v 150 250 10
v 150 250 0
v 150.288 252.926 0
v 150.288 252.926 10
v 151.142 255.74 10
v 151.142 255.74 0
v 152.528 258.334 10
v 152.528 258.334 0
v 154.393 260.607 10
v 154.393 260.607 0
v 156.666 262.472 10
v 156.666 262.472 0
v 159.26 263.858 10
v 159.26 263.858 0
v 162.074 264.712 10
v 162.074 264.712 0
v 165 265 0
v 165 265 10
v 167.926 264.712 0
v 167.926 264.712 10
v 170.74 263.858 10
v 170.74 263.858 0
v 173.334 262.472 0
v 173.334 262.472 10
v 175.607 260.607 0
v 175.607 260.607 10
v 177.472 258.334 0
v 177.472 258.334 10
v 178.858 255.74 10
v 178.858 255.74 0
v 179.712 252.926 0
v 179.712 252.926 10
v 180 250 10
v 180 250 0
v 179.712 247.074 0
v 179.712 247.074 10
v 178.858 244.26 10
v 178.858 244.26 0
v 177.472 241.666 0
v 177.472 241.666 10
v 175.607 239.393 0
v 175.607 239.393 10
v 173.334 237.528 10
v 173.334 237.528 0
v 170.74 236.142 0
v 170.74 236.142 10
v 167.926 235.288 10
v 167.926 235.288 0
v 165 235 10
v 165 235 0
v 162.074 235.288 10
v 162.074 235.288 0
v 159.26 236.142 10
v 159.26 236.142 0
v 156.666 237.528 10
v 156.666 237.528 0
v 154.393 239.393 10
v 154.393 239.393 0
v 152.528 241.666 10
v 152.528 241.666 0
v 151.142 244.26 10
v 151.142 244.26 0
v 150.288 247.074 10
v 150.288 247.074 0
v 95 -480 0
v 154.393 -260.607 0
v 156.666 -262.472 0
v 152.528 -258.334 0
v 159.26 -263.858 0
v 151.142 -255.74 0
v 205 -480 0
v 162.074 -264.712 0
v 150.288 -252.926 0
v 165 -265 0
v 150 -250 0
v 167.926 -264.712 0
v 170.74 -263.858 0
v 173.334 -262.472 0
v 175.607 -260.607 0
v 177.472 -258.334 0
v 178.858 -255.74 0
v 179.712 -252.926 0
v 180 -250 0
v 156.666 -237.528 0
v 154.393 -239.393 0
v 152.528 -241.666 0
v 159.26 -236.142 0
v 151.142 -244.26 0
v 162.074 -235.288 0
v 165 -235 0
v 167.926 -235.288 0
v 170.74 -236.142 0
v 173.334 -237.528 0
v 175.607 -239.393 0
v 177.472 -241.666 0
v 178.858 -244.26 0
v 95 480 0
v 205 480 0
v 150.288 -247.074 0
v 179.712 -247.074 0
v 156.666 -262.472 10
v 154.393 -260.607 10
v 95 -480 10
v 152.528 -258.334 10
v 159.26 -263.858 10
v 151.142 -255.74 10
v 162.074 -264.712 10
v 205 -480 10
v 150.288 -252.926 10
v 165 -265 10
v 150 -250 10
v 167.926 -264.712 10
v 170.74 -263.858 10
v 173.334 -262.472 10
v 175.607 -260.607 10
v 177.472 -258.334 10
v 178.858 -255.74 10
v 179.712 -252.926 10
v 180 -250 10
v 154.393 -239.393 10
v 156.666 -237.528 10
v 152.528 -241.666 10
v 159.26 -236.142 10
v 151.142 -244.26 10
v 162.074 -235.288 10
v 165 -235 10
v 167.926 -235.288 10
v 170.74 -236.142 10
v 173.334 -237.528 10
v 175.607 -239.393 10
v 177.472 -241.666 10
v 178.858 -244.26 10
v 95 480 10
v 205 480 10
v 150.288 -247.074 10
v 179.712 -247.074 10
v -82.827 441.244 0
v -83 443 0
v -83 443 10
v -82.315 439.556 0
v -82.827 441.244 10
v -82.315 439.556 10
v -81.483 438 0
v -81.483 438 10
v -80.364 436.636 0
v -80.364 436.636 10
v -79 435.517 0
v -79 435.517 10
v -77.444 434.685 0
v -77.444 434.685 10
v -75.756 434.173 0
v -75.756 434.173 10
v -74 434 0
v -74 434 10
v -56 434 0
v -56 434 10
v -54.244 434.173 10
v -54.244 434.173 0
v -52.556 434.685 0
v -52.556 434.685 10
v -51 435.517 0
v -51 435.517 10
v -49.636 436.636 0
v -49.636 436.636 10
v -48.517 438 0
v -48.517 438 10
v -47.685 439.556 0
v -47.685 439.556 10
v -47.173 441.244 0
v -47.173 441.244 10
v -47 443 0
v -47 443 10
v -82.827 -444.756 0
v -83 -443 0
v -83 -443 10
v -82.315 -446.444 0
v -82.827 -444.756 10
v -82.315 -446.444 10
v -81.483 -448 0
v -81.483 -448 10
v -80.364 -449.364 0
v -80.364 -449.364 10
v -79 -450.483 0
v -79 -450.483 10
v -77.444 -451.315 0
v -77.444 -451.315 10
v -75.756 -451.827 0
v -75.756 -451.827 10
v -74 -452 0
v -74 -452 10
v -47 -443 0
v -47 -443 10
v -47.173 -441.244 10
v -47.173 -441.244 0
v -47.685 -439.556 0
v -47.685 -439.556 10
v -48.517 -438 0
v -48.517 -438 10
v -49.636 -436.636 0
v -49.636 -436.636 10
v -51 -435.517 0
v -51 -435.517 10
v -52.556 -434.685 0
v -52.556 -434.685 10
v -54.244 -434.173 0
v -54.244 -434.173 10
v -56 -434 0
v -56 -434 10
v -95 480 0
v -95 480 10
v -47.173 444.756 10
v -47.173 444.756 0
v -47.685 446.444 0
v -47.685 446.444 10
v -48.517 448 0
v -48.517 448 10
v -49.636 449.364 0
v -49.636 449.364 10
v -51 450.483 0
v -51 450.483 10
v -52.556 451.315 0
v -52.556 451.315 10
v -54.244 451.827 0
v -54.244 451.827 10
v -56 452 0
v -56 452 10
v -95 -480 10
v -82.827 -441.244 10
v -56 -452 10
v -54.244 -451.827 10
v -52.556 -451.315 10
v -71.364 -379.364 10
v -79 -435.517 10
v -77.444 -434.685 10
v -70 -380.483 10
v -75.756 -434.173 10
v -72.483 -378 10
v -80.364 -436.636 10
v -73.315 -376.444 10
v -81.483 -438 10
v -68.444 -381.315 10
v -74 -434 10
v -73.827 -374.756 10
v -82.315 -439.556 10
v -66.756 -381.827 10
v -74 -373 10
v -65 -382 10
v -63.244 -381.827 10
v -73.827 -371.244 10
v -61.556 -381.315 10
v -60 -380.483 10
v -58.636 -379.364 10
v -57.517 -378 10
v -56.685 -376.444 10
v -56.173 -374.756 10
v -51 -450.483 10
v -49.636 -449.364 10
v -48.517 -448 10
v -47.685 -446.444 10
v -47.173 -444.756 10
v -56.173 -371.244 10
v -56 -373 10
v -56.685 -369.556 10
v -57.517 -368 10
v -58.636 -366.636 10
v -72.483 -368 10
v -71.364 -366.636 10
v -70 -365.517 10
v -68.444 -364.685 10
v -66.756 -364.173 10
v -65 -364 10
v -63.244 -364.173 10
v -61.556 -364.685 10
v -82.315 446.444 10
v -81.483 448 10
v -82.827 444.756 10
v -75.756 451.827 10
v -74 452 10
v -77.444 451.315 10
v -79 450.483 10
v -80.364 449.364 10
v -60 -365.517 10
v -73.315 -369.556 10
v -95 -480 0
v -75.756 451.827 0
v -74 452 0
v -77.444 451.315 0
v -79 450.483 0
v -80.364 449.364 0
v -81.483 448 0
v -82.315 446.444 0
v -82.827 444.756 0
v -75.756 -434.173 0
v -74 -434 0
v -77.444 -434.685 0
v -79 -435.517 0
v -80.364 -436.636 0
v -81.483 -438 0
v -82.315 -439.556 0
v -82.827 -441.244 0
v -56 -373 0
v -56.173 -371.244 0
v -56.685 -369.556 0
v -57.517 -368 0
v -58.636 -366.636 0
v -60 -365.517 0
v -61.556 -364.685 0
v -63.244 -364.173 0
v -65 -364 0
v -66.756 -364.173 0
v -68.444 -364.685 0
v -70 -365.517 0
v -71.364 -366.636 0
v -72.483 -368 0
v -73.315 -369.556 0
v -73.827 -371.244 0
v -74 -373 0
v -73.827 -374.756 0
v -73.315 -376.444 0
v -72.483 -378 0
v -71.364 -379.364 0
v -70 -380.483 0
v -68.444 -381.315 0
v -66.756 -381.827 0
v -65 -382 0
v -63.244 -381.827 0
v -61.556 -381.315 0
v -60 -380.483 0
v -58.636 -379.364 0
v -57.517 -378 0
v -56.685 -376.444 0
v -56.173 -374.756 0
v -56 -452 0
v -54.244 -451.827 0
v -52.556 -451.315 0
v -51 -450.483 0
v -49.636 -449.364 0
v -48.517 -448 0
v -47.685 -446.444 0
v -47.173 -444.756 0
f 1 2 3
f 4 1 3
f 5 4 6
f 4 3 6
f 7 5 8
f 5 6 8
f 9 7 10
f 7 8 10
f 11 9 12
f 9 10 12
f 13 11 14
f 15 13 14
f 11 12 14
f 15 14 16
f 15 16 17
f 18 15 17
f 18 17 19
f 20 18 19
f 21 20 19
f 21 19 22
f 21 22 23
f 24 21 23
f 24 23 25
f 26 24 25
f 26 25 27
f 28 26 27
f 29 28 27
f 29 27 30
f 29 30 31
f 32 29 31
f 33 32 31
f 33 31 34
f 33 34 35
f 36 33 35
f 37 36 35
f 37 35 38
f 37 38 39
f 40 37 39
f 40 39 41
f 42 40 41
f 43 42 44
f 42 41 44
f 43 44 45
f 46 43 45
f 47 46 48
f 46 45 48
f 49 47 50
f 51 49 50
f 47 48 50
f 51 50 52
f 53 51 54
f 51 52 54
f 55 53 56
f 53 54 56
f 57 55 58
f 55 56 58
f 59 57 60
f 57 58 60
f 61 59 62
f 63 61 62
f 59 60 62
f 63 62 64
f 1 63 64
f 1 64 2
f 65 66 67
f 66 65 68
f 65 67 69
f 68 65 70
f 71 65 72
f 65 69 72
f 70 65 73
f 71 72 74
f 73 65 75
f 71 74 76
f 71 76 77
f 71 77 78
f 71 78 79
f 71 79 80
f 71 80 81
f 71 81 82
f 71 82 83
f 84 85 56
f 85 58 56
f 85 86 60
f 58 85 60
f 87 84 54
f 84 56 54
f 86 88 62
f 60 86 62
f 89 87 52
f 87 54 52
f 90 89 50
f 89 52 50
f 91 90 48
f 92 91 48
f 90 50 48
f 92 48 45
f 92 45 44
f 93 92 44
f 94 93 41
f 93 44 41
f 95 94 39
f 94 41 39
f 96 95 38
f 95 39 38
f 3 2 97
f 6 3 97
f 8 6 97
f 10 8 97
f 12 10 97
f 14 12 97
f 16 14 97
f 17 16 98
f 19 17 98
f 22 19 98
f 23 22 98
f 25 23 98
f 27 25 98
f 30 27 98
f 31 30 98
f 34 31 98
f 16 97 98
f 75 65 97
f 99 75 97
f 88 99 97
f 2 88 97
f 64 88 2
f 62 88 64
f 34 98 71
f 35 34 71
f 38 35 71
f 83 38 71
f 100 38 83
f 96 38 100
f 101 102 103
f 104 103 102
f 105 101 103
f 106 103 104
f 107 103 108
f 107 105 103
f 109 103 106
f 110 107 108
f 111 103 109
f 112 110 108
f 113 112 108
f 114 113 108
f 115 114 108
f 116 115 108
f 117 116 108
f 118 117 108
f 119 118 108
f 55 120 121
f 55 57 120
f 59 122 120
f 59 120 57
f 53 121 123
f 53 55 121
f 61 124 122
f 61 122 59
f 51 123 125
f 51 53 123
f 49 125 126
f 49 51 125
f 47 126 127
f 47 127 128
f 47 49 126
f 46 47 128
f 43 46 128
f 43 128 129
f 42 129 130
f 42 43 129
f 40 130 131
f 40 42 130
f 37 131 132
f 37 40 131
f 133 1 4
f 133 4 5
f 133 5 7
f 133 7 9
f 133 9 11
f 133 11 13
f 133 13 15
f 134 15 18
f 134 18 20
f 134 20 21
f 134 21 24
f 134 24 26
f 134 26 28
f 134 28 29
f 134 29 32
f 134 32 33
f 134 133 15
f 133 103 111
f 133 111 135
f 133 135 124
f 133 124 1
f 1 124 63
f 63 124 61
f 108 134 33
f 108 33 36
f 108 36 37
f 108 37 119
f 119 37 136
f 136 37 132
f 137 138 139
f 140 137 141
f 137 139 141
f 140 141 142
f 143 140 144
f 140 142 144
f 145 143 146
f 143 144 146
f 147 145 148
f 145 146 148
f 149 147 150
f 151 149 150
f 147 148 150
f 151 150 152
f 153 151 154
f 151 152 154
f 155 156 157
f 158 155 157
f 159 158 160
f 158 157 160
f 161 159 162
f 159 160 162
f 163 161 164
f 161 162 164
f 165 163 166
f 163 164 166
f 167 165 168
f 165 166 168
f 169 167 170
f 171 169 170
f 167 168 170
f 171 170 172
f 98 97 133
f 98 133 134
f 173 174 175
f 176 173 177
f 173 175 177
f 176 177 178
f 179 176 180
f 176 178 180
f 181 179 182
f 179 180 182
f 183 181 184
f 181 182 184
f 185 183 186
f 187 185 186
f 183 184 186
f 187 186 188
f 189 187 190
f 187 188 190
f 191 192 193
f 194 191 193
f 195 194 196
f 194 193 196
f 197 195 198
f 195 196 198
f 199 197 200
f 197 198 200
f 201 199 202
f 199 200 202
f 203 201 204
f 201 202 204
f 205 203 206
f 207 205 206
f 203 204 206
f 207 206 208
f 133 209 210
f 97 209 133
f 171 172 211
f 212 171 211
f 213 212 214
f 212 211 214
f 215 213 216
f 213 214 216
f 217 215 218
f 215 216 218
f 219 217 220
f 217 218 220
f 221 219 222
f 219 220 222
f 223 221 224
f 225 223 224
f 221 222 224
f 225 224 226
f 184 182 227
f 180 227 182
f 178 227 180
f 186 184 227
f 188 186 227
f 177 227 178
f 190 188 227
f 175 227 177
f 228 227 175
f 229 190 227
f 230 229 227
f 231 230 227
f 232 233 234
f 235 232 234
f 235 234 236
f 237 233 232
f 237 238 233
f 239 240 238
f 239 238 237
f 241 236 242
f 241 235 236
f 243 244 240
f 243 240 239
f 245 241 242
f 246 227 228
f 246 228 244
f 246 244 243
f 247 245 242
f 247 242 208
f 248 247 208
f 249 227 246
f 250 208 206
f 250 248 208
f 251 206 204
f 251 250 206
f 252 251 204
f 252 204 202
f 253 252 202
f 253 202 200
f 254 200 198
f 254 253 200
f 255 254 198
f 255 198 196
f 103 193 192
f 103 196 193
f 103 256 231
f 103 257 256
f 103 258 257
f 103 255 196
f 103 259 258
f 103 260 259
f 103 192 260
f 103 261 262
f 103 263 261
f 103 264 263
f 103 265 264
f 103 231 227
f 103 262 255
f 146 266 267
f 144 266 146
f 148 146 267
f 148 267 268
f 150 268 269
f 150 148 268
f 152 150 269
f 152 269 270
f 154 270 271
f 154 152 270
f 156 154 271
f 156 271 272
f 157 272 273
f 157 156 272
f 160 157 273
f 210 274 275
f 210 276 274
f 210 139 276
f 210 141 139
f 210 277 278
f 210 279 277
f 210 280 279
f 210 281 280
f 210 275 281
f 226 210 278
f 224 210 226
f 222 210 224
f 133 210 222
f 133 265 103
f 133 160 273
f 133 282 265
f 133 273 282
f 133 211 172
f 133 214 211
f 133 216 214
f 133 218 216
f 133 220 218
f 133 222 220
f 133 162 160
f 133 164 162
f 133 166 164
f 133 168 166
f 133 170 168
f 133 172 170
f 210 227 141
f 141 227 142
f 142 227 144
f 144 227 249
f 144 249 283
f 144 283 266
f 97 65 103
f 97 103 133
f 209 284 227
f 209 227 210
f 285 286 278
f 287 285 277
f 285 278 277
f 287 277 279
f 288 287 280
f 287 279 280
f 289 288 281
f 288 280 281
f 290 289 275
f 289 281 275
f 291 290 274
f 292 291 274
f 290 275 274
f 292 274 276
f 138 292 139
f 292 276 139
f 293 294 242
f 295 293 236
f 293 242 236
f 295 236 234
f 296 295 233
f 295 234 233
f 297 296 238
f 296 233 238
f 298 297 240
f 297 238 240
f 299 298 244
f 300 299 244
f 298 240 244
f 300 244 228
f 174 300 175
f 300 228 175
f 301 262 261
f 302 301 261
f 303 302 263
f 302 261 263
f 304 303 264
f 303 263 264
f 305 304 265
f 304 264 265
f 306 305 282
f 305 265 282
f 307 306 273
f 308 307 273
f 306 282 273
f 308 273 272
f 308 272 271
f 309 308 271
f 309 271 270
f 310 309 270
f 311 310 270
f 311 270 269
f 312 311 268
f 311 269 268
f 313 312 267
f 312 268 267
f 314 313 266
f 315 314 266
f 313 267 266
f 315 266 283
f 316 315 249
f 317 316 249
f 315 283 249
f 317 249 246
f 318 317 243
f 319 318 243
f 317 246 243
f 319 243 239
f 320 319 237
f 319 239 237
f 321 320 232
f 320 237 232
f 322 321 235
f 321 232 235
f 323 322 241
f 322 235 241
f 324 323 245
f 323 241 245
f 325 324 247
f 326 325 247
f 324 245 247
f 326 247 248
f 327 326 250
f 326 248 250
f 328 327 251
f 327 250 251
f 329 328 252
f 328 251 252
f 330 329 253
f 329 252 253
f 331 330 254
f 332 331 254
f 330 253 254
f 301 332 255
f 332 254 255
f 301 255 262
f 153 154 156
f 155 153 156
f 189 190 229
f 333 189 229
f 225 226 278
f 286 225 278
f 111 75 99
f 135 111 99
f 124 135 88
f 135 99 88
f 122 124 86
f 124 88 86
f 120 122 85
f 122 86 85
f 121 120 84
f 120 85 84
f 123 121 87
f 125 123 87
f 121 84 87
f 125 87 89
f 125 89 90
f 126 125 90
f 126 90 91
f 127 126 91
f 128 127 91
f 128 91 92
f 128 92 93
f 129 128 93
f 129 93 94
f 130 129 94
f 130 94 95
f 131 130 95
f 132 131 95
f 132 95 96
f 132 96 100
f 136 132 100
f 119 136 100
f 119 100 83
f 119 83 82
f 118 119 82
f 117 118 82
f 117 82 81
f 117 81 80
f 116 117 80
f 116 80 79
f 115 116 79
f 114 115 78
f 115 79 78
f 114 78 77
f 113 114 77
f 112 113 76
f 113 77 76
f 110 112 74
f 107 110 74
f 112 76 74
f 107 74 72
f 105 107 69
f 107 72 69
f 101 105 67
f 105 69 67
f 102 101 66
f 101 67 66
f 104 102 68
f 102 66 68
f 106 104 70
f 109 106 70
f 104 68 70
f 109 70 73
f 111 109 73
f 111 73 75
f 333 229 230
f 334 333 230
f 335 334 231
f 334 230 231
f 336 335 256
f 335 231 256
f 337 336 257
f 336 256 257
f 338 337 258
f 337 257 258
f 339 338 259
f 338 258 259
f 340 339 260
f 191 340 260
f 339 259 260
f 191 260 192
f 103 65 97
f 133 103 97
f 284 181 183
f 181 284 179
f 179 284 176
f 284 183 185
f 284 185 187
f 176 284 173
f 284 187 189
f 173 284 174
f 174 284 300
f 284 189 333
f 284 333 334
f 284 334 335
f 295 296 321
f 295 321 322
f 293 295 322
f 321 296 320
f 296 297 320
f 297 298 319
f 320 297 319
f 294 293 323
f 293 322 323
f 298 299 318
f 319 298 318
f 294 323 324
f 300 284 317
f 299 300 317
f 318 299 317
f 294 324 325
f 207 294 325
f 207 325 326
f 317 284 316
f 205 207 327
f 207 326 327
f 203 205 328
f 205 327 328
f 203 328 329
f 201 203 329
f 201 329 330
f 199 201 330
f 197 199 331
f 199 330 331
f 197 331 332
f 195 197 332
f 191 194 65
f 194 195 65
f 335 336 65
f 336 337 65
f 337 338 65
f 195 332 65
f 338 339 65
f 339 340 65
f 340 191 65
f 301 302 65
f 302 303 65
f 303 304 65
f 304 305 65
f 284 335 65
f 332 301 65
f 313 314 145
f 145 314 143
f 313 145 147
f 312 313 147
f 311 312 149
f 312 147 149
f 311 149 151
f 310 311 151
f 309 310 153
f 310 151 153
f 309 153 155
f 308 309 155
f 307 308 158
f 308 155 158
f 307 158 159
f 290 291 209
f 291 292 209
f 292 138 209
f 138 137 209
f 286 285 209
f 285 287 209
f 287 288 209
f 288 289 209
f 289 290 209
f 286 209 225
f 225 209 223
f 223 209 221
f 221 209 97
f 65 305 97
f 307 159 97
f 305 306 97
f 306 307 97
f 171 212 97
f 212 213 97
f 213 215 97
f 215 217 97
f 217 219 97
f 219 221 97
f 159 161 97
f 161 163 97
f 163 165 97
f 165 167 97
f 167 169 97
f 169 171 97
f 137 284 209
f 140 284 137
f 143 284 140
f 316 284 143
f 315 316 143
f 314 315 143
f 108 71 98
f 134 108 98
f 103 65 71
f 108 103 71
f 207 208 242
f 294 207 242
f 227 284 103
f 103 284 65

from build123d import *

# Parameters (mm, degrees)
F0_W     = 190
F0_H     = 960
F1_DEPTH = 10
F0_W_2   = 110
F2_DEPTH = 10
F3_R     = 9
F4_DEPTH = 10
F5_D     = 30


with BuildPart() as f1:
    # F0 (on Top) → F1 (new body)
    with BuildSketch(Plane.XY):
        Rectangle(F0_W, F0_H)
    extrude(amount=F1_DEPTH)

    # F3 (on face) → F4 (cut, through all)
    with BuildSketch(Plane.XY.offset(10)):
        with BuildLine():
            ThreePointArc((-47, -443), (-49.6360389693, -436.6360389693), (-56, -434))
            Line((-56, -434), (-74, -434))
            ThreePointArc((-74, -434), (-80.3639610307, -436.6360389693), (-83, -443))
            ThreePointArc((-83, -443), (-80.3639610307, -449.3639610307), (-74, -452))
            Line((-74, -452), (-56, -452))
            ThreePointArc((-56, -452), (-49.6360389693, -449.3639610307), (-47, -443))
        make_face()
        with Locations((-65, -373)):
            Circle(F3_R)
        with BuildLine():
            ThreePointArc((-47, 443), (-49.6360389693, 449.3639610307), (-56, 452))
            Line((-56, 452), (-74, 452))
            ThreePointArc((-74, 452), (-80.3639610307, 449.3639610307), (-83, 443))
            ThreePointArc((-83, 443), (-80.3639610307, 436.6360389693), (-74, 434))
            Line((-74, 434), (-56, 434))
            ThreePointArc((-56, 434), (-49.6360389693, 436.6360389693), (-47, 443))
        make_face()
    extrude(amount=-F4_DEPTH, mode=Mode.SUBTRACT)


with BuildPart() as f2:
    # F0 (on Top) → F2 (new body)
    with BuildSketch(Plane.XY):
        with Locations((150, 0)):
            Rectangle(F0_W_2, F0_H)
    extrude(amount=F2_DEPTH)

    # F5 (through all)
    with Locations(Plane.XY.offset(10)):
        with Locations((165, 250), (165, -250)):
            Hole(F5_D / 2)


solid = Compound([f1.part, f2.part])
